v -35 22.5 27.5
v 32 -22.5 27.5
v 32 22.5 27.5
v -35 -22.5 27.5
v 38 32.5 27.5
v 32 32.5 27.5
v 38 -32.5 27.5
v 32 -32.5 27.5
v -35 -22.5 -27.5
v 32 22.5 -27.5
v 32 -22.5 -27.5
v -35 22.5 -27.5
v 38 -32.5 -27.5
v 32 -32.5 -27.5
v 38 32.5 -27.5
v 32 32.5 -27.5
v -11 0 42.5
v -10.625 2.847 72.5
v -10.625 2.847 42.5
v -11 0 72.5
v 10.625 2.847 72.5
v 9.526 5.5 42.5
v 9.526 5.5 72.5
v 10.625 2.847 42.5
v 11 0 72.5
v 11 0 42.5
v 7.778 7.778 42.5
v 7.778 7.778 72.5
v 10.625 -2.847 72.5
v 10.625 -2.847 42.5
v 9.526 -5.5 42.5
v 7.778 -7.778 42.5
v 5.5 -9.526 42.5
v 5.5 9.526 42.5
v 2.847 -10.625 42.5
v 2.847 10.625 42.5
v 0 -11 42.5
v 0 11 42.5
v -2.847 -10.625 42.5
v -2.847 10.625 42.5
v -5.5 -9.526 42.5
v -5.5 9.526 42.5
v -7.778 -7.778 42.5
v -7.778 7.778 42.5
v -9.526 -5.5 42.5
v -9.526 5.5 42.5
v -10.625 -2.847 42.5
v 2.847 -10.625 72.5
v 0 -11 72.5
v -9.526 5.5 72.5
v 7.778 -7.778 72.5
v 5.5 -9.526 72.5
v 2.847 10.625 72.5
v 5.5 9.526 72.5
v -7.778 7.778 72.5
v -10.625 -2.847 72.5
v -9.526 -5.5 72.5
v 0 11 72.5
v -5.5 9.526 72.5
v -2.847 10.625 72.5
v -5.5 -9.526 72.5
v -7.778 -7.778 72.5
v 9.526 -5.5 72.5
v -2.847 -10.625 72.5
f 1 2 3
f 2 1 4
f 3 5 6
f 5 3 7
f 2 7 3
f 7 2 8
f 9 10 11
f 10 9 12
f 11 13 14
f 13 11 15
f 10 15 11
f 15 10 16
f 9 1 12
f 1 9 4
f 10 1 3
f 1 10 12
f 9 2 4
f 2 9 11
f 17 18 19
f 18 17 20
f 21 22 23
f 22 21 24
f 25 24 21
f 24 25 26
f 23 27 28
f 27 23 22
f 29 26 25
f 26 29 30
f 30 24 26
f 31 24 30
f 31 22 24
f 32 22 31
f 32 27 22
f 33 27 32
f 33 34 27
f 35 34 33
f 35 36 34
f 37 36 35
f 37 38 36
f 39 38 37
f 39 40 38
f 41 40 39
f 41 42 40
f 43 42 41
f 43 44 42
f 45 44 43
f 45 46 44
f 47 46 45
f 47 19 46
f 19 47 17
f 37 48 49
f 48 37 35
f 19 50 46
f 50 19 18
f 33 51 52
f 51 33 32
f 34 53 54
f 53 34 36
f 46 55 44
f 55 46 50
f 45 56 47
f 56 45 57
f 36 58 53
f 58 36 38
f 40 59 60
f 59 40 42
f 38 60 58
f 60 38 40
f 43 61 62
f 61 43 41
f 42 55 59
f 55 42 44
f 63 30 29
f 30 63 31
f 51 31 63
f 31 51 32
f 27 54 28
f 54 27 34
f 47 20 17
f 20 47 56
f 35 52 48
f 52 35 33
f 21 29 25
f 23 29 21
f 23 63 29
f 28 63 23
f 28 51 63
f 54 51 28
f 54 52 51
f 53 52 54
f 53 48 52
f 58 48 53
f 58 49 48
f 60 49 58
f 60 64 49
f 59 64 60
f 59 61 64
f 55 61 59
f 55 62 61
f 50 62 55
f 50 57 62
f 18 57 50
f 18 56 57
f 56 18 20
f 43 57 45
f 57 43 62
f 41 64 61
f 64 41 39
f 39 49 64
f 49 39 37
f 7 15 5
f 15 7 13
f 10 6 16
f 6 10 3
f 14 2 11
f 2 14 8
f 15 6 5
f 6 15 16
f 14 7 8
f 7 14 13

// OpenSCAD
// OSY gate tamper switch — bolt-on to valve yoke.
body_w = 70;
body_d = 45;
body_h = 55;
cube(size = [body_w, body_d, body_h], center = true);
// Conduit entry
translate([0, 0, body_h / 2 + 15])
    cylinder(h = 30, d = 22, $fn = 24);
// Mounting bracket
translate([body_w / 2, 0, 0])
    cube(size = [6, body_d + 20, body_h], center = true);
